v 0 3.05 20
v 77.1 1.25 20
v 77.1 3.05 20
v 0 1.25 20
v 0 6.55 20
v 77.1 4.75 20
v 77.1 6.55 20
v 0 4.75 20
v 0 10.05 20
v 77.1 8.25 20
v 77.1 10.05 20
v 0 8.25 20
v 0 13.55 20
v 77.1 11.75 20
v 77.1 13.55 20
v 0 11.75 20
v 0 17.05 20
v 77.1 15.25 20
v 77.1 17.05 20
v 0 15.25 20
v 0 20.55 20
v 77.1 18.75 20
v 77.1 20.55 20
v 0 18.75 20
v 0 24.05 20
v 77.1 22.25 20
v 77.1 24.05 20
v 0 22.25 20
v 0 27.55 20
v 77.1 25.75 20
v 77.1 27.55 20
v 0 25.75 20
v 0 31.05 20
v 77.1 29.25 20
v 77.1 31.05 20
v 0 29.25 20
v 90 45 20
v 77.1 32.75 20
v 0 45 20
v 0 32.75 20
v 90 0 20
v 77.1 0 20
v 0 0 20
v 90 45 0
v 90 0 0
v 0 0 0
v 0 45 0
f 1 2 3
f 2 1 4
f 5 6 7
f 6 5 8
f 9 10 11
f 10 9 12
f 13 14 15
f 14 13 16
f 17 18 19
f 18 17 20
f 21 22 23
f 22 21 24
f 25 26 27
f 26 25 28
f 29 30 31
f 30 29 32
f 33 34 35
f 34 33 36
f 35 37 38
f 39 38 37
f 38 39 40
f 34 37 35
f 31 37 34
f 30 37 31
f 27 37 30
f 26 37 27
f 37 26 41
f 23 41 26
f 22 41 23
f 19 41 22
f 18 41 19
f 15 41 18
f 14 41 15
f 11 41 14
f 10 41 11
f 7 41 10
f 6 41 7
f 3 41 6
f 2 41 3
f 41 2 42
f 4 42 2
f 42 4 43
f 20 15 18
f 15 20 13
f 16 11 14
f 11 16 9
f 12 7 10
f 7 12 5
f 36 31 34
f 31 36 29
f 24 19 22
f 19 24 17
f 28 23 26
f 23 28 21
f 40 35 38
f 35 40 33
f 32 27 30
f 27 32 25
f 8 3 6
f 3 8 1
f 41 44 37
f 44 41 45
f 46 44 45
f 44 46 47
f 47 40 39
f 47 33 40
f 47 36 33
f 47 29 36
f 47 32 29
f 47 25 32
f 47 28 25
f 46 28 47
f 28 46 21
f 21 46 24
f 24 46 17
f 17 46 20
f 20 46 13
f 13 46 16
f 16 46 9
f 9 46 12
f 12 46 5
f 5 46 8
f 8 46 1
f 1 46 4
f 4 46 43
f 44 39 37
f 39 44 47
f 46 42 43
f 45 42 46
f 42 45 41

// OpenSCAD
// Drying Rack for 10 Microscope Slides
// Base: 90 x 45 x 20 mm
// Slots: 10 parallel slots along X, 77mm long, 1.6mm wide, 10mm deep
// Spacing: 3.5mm centre-to-centre in Y, centred on block

$fn = 128;

// Base Dimensions
base_length = 90;
base_width = 45;
base_height = 20;

// Slide Dimensions (for reference)
slide_length = 75;
slide_width = 25;
slide_thickness = 1;

// Slot Dimensions
slot_length = 77;
slot_width = 1.6;
slot_depth = 10;

// Layout Dimensions
slot_spacing = 3.5; // Centre-to-centre in Y
num_slots = 10;

// Calculate Y position of the first slot centre
// Total width of slots = num_slots * slot_width
// Total width of gaps = (num_slots - 1) * slot_spacing
// Remaining space to distribute on both sides = (base_width - total_slots - total_gaps) / 2
total_slot_width = num_slots * slot_width;
total_gap_width = (num_slots - 1) * slot_spacing;
offset_from_edge = (base_width - total_slot_width - total_gap_width) / 2;
first_slot_y = offset_from_edge + slot_width / 2;

// Build the solid block
difference() {
    // Main Block
    cube([base_length, base_width, base_height], center = false);
    
    // Cut Slots
    // Slots run along X, so we cut from the top face (Z = base_height) down to Z = base_height - slot_depth
    // We use a loop to generate the 10 slots
    for (i = [0 : num_slots - 1]) {
        // Calculate Y position for current slot
        y_pos = first_slot_y + (i * slot_spacing);
        
        // Define the slot geometry
        // The slot is a rectangular prism cut into the top
        translate([
            0,              // X position (runs full length, centred)
            y_pos,          // Y position
            base_height     // Z position (start at top surface)
        ]) {
            // Cut a block that is slightly larger than the slot to ensure clean cut
            // Extending 0.1mm past the faces as per rules
            // Note: The nested difference() was removed to allow this cube to actually cut the main block
            cube([
                slot_length + 0.1,
                slot_width + 0.1,
                slot_depth + 0.1
            ]);
        }
    }
}
